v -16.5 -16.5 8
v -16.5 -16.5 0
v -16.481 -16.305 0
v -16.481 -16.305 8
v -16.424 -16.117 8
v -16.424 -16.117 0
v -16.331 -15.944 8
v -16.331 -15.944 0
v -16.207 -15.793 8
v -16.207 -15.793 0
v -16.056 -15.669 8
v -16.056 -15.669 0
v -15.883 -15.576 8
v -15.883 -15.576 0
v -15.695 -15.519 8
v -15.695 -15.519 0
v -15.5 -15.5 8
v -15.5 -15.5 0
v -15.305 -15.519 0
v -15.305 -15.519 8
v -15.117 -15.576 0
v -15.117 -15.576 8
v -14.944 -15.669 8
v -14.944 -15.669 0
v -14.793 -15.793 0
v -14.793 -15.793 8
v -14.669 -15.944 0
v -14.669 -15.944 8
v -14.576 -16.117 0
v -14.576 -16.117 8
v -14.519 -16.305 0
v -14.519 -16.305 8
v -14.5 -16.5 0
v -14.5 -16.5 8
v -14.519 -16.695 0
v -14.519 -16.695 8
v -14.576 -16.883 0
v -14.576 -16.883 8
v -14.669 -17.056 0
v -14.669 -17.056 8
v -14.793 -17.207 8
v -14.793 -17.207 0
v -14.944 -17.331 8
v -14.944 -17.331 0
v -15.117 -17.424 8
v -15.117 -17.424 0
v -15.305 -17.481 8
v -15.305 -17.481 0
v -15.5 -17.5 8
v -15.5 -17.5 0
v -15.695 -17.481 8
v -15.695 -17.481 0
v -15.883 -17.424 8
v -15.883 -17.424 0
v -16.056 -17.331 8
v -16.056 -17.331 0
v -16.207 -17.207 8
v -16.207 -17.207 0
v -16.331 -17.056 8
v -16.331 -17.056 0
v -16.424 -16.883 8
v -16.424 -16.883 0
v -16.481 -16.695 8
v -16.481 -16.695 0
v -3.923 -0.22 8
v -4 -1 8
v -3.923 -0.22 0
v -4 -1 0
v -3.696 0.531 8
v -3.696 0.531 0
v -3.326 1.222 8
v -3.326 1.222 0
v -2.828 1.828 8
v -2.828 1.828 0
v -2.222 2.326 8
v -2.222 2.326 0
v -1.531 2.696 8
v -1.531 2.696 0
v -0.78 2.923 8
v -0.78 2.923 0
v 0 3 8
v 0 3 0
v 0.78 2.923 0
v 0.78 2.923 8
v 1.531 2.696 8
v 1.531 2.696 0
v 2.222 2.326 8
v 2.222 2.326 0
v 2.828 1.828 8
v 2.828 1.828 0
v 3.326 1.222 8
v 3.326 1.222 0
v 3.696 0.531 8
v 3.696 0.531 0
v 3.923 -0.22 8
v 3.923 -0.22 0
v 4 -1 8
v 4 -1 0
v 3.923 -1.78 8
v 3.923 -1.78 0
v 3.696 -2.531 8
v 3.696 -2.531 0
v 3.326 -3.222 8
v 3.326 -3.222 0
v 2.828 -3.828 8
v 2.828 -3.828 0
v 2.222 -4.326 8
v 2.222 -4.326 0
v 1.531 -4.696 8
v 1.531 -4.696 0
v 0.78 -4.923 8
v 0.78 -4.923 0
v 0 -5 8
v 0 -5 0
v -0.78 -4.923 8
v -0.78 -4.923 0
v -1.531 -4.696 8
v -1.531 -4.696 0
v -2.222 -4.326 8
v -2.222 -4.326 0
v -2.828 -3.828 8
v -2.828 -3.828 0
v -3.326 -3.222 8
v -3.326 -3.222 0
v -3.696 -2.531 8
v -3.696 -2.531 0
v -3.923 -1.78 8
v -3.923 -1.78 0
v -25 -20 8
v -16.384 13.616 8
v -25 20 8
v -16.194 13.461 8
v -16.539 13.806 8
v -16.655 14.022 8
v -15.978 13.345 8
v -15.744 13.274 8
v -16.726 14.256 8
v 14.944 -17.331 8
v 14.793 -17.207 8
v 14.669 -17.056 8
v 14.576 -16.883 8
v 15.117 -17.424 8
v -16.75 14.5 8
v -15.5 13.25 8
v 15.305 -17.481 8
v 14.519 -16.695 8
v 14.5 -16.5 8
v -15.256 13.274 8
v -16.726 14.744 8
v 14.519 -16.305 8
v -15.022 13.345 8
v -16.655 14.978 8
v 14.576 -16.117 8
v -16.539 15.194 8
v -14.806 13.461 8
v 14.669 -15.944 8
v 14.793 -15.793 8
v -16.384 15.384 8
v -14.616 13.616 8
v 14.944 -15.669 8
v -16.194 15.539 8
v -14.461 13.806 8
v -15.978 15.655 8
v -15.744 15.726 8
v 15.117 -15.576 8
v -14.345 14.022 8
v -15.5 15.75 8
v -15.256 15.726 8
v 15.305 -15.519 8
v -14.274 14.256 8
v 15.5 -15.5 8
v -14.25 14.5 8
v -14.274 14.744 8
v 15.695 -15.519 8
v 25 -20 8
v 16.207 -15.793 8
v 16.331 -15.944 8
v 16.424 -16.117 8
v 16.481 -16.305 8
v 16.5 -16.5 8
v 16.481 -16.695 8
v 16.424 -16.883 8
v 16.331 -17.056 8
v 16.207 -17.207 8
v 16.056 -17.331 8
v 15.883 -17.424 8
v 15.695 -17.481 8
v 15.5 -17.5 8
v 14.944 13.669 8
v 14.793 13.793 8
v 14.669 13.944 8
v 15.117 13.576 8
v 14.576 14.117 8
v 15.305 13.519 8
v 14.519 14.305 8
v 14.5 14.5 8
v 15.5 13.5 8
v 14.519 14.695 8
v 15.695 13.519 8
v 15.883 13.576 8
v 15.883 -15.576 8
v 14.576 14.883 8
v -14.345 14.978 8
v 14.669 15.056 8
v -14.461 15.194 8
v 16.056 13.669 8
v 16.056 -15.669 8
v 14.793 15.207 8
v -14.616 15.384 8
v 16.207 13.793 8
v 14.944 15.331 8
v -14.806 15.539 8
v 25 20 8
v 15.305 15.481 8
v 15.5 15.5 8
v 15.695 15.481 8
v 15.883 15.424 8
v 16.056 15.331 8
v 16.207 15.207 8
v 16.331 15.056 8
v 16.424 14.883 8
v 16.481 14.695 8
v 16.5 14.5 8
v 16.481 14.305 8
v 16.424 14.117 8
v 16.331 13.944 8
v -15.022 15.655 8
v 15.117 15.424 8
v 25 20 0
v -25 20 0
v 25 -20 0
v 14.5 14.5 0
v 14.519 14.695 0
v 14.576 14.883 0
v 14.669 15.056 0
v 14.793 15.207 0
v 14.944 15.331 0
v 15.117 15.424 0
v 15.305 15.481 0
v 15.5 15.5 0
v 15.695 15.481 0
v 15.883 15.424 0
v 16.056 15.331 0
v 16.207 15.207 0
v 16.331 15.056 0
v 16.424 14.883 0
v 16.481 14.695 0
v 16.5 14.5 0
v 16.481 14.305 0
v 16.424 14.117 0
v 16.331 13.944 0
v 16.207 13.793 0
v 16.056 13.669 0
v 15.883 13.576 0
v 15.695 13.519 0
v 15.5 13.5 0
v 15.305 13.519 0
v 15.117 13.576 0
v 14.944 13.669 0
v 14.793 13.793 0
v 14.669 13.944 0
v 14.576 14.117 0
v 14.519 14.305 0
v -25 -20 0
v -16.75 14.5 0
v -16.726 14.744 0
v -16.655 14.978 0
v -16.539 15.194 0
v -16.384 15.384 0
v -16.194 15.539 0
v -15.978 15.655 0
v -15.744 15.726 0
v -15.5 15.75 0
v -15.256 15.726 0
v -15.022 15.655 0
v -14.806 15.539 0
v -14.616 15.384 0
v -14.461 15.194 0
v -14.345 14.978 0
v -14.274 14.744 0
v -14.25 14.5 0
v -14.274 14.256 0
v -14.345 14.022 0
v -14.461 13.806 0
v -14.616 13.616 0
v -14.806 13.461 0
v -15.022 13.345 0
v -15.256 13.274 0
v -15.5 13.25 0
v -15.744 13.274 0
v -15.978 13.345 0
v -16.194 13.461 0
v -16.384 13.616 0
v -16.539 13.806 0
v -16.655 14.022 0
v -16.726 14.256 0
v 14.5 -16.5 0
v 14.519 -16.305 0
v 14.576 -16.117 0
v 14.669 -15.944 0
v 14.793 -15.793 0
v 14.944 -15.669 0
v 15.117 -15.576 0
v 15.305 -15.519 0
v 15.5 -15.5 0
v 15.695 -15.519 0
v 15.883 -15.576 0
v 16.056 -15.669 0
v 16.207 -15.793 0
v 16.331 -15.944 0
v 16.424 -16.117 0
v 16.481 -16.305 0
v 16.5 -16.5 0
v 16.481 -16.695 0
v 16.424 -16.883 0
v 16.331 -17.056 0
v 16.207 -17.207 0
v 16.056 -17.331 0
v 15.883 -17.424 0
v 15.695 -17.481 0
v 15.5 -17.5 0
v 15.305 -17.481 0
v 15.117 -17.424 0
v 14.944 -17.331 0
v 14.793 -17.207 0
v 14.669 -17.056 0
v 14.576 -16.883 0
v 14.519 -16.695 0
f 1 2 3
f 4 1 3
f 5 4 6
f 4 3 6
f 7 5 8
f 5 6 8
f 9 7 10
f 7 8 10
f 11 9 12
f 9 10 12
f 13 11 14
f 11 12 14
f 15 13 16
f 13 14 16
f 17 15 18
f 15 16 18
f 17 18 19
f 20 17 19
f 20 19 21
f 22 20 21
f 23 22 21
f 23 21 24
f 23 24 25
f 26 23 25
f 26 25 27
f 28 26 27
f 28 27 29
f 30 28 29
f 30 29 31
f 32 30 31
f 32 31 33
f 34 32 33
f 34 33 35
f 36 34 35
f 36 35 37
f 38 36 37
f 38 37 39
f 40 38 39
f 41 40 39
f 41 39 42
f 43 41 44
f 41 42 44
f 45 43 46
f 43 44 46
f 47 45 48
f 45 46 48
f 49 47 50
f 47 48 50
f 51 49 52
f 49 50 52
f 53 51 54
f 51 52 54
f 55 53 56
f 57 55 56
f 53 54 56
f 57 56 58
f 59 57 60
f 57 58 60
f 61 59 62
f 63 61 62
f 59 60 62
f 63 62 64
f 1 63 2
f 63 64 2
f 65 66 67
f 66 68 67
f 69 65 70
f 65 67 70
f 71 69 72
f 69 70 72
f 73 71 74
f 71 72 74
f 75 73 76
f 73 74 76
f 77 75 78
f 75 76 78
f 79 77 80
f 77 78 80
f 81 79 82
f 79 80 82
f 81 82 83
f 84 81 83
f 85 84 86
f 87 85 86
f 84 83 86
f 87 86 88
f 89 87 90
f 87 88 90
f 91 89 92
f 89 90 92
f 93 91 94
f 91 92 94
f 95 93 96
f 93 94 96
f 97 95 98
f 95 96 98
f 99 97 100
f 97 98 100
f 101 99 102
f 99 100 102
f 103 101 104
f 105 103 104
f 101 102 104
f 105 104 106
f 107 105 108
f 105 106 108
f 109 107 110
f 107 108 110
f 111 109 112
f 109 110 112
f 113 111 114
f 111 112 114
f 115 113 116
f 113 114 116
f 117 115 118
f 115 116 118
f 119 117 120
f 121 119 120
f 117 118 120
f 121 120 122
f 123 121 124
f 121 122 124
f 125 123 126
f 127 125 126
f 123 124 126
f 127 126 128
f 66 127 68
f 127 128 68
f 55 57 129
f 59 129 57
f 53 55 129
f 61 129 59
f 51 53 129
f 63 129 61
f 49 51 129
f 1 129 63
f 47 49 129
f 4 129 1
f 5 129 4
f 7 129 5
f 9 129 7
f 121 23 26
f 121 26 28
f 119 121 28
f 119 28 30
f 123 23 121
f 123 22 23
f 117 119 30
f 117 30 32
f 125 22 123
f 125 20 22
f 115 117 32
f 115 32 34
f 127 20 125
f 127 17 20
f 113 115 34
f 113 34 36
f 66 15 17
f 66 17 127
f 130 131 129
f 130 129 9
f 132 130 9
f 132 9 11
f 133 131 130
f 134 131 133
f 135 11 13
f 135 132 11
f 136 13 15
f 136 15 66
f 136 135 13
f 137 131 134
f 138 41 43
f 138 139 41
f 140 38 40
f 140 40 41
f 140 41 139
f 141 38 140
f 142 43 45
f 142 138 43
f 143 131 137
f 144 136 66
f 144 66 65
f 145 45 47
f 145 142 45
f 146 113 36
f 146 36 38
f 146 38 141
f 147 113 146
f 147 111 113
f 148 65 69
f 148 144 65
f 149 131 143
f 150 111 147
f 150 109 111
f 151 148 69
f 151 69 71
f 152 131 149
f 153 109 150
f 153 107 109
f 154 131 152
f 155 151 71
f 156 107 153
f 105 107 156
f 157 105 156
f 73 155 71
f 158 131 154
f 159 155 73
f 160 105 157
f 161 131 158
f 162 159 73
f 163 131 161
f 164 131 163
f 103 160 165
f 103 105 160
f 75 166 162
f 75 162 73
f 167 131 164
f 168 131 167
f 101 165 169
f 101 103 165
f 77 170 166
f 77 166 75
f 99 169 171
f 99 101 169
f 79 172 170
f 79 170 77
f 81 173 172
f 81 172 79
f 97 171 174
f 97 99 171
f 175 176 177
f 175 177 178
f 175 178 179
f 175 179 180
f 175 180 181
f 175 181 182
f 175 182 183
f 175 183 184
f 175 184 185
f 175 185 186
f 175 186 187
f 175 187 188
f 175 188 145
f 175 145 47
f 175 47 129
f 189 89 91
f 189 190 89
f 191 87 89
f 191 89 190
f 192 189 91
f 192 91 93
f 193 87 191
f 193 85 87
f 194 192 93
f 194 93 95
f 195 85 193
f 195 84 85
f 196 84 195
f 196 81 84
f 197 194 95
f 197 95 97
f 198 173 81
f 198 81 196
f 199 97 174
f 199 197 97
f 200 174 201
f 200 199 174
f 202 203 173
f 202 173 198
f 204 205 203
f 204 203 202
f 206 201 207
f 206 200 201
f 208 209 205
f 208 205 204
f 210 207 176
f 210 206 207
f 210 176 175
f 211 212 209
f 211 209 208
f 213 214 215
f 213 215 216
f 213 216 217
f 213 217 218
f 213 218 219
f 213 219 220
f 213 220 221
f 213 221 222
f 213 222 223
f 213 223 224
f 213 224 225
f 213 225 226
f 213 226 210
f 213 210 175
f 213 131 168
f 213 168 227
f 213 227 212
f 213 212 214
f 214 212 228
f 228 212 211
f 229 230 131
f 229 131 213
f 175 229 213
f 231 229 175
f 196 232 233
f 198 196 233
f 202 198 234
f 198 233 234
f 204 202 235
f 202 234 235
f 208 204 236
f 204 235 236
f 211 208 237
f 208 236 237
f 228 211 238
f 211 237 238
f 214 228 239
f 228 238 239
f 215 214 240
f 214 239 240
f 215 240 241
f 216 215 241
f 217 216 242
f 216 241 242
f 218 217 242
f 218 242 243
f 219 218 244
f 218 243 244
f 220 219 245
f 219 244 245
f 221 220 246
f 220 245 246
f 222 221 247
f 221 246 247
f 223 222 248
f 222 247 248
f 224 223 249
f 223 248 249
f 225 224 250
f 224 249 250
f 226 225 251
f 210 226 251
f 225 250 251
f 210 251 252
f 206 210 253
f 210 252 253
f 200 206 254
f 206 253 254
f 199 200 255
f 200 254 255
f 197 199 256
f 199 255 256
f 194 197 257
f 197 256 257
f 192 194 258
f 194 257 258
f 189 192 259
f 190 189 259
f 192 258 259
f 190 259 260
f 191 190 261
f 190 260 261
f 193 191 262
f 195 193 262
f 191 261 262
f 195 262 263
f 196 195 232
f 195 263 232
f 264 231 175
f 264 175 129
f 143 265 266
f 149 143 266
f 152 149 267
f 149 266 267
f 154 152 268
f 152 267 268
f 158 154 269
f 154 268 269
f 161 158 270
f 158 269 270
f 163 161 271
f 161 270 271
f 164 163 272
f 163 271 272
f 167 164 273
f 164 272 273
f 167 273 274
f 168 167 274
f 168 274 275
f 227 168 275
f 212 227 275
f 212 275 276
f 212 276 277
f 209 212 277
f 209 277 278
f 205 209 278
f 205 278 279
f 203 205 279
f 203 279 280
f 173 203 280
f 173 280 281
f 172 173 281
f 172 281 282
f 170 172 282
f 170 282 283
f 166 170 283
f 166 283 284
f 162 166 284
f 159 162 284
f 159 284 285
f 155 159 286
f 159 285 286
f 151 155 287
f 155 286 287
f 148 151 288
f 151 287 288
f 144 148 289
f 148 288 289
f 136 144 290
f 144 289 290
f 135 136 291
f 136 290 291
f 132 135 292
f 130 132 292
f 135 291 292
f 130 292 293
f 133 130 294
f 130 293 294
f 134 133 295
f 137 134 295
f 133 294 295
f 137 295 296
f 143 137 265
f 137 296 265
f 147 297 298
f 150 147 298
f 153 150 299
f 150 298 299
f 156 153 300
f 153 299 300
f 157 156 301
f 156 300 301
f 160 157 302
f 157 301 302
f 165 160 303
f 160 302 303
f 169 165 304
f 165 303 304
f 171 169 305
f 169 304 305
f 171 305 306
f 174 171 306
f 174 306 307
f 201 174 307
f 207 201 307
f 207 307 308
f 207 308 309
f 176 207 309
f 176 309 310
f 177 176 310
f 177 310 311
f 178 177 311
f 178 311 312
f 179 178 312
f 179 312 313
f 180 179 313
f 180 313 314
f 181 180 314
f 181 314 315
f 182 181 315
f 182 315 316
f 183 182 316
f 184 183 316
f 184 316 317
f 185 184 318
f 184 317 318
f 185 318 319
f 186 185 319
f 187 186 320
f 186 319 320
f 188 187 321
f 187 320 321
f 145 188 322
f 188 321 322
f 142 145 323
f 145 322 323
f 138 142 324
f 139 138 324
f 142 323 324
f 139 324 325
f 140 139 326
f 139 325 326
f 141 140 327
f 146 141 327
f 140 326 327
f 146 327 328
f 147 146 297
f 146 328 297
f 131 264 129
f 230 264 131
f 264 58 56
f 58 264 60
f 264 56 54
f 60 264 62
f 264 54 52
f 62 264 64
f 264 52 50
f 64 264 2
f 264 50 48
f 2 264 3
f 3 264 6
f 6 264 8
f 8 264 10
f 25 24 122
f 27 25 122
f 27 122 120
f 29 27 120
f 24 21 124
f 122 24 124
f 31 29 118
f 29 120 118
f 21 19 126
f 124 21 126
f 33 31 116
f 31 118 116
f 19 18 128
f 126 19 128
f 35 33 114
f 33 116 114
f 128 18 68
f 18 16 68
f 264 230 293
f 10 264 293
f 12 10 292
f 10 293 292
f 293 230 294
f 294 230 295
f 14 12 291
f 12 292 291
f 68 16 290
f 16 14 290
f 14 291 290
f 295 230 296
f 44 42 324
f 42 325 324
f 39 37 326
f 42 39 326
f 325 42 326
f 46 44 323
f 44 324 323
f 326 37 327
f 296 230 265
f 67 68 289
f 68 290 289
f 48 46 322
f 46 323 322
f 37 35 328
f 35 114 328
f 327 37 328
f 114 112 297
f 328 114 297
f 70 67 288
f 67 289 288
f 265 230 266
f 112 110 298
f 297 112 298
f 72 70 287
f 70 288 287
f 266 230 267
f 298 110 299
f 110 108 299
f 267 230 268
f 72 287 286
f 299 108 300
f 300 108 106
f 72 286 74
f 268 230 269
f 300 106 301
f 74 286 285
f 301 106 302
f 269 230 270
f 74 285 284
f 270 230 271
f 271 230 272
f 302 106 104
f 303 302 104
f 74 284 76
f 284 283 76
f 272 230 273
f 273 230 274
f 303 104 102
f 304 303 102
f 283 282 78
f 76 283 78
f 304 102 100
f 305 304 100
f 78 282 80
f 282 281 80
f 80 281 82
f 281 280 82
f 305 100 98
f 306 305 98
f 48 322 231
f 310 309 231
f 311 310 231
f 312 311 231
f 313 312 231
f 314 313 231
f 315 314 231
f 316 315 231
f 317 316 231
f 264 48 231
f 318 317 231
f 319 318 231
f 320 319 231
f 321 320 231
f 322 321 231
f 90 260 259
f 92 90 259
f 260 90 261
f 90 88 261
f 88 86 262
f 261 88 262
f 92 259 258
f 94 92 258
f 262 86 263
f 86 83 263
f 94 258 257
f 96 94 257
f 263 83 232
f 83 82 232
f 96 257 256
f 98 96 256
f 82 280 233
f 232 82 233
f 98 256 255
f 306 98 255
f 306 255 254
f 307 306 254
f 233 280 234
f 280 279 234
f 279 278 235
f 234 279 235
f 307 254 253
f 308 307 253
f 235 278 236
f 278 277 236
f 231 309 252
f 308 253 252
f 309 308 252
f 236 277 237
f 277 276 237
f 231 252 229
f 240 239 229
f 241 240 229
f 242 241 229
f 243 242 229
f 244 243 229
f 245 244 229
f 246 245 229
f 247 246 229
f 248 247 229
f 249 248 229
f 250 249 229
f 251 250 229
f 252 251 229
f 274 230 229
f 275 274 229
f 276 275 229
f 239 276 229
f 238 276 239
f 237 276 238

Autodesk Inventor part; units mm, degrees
ref_plane "YZ Plane" through (0, 0, 0) normal (1, 0, 0) x (0, 1, 0)
ref_plane "XZ Plane" through (0, 0, 0) normal (0, 1, 0) x (-1, 0, 0)
ref_plane "XY Plane" through (0, 0, 0) normal (0, 0, 1) x (1, 0, 0)
sketch "Sketch1" plane through (0, 0, 0) normal (0, 0, 1) x (1, 0, 0)
  line L0 (-25, 20) -> (25, 20)
  line L1 (25, 20) -> (25, -20)
  line L2 (25, -20) -> (-25, -20)
  line L3 (-25, -20) -> (-25, 20)
  point P0 (0, 0)
  point P1 (0, 20)
  point P2 (-25, 0)
  dimension "d0" = 50
  dimension "d1" = 40
extrude "Extrusion1" add sketch "Sketch1" along normal blind 8
sketch "Sketch5" plane through (0, 0, 0) normal (0, 0, -1) x (-1, 0, 0)
  circle A0 centre (-15.5, -16.5) radius 1 projected
  circle A1 centre (15.5, -16.5) radius 1 projected
  circle A2 centre (-15.5, 14.5) radius 1 projected
  circle A3 centre (15.5, 14.5) radius 1.25 projected
  arc A4 (-2, -2.5) -> (-2, 0.5) centre (0, -1) ccw
  line L0 (-2, -2.5) -> (-2, 0.5)
  circle A5 centre (0, -1) radius 4
  point P0 (0, 0)
  dimension "d29" = 8
extrude "Extrusion5" cut sketch "Sketch5" against normal through all contours A0 | A1 | A2 | A3 | L0 A4 | A5
properties part number "0005-10-020 suport motor y"
